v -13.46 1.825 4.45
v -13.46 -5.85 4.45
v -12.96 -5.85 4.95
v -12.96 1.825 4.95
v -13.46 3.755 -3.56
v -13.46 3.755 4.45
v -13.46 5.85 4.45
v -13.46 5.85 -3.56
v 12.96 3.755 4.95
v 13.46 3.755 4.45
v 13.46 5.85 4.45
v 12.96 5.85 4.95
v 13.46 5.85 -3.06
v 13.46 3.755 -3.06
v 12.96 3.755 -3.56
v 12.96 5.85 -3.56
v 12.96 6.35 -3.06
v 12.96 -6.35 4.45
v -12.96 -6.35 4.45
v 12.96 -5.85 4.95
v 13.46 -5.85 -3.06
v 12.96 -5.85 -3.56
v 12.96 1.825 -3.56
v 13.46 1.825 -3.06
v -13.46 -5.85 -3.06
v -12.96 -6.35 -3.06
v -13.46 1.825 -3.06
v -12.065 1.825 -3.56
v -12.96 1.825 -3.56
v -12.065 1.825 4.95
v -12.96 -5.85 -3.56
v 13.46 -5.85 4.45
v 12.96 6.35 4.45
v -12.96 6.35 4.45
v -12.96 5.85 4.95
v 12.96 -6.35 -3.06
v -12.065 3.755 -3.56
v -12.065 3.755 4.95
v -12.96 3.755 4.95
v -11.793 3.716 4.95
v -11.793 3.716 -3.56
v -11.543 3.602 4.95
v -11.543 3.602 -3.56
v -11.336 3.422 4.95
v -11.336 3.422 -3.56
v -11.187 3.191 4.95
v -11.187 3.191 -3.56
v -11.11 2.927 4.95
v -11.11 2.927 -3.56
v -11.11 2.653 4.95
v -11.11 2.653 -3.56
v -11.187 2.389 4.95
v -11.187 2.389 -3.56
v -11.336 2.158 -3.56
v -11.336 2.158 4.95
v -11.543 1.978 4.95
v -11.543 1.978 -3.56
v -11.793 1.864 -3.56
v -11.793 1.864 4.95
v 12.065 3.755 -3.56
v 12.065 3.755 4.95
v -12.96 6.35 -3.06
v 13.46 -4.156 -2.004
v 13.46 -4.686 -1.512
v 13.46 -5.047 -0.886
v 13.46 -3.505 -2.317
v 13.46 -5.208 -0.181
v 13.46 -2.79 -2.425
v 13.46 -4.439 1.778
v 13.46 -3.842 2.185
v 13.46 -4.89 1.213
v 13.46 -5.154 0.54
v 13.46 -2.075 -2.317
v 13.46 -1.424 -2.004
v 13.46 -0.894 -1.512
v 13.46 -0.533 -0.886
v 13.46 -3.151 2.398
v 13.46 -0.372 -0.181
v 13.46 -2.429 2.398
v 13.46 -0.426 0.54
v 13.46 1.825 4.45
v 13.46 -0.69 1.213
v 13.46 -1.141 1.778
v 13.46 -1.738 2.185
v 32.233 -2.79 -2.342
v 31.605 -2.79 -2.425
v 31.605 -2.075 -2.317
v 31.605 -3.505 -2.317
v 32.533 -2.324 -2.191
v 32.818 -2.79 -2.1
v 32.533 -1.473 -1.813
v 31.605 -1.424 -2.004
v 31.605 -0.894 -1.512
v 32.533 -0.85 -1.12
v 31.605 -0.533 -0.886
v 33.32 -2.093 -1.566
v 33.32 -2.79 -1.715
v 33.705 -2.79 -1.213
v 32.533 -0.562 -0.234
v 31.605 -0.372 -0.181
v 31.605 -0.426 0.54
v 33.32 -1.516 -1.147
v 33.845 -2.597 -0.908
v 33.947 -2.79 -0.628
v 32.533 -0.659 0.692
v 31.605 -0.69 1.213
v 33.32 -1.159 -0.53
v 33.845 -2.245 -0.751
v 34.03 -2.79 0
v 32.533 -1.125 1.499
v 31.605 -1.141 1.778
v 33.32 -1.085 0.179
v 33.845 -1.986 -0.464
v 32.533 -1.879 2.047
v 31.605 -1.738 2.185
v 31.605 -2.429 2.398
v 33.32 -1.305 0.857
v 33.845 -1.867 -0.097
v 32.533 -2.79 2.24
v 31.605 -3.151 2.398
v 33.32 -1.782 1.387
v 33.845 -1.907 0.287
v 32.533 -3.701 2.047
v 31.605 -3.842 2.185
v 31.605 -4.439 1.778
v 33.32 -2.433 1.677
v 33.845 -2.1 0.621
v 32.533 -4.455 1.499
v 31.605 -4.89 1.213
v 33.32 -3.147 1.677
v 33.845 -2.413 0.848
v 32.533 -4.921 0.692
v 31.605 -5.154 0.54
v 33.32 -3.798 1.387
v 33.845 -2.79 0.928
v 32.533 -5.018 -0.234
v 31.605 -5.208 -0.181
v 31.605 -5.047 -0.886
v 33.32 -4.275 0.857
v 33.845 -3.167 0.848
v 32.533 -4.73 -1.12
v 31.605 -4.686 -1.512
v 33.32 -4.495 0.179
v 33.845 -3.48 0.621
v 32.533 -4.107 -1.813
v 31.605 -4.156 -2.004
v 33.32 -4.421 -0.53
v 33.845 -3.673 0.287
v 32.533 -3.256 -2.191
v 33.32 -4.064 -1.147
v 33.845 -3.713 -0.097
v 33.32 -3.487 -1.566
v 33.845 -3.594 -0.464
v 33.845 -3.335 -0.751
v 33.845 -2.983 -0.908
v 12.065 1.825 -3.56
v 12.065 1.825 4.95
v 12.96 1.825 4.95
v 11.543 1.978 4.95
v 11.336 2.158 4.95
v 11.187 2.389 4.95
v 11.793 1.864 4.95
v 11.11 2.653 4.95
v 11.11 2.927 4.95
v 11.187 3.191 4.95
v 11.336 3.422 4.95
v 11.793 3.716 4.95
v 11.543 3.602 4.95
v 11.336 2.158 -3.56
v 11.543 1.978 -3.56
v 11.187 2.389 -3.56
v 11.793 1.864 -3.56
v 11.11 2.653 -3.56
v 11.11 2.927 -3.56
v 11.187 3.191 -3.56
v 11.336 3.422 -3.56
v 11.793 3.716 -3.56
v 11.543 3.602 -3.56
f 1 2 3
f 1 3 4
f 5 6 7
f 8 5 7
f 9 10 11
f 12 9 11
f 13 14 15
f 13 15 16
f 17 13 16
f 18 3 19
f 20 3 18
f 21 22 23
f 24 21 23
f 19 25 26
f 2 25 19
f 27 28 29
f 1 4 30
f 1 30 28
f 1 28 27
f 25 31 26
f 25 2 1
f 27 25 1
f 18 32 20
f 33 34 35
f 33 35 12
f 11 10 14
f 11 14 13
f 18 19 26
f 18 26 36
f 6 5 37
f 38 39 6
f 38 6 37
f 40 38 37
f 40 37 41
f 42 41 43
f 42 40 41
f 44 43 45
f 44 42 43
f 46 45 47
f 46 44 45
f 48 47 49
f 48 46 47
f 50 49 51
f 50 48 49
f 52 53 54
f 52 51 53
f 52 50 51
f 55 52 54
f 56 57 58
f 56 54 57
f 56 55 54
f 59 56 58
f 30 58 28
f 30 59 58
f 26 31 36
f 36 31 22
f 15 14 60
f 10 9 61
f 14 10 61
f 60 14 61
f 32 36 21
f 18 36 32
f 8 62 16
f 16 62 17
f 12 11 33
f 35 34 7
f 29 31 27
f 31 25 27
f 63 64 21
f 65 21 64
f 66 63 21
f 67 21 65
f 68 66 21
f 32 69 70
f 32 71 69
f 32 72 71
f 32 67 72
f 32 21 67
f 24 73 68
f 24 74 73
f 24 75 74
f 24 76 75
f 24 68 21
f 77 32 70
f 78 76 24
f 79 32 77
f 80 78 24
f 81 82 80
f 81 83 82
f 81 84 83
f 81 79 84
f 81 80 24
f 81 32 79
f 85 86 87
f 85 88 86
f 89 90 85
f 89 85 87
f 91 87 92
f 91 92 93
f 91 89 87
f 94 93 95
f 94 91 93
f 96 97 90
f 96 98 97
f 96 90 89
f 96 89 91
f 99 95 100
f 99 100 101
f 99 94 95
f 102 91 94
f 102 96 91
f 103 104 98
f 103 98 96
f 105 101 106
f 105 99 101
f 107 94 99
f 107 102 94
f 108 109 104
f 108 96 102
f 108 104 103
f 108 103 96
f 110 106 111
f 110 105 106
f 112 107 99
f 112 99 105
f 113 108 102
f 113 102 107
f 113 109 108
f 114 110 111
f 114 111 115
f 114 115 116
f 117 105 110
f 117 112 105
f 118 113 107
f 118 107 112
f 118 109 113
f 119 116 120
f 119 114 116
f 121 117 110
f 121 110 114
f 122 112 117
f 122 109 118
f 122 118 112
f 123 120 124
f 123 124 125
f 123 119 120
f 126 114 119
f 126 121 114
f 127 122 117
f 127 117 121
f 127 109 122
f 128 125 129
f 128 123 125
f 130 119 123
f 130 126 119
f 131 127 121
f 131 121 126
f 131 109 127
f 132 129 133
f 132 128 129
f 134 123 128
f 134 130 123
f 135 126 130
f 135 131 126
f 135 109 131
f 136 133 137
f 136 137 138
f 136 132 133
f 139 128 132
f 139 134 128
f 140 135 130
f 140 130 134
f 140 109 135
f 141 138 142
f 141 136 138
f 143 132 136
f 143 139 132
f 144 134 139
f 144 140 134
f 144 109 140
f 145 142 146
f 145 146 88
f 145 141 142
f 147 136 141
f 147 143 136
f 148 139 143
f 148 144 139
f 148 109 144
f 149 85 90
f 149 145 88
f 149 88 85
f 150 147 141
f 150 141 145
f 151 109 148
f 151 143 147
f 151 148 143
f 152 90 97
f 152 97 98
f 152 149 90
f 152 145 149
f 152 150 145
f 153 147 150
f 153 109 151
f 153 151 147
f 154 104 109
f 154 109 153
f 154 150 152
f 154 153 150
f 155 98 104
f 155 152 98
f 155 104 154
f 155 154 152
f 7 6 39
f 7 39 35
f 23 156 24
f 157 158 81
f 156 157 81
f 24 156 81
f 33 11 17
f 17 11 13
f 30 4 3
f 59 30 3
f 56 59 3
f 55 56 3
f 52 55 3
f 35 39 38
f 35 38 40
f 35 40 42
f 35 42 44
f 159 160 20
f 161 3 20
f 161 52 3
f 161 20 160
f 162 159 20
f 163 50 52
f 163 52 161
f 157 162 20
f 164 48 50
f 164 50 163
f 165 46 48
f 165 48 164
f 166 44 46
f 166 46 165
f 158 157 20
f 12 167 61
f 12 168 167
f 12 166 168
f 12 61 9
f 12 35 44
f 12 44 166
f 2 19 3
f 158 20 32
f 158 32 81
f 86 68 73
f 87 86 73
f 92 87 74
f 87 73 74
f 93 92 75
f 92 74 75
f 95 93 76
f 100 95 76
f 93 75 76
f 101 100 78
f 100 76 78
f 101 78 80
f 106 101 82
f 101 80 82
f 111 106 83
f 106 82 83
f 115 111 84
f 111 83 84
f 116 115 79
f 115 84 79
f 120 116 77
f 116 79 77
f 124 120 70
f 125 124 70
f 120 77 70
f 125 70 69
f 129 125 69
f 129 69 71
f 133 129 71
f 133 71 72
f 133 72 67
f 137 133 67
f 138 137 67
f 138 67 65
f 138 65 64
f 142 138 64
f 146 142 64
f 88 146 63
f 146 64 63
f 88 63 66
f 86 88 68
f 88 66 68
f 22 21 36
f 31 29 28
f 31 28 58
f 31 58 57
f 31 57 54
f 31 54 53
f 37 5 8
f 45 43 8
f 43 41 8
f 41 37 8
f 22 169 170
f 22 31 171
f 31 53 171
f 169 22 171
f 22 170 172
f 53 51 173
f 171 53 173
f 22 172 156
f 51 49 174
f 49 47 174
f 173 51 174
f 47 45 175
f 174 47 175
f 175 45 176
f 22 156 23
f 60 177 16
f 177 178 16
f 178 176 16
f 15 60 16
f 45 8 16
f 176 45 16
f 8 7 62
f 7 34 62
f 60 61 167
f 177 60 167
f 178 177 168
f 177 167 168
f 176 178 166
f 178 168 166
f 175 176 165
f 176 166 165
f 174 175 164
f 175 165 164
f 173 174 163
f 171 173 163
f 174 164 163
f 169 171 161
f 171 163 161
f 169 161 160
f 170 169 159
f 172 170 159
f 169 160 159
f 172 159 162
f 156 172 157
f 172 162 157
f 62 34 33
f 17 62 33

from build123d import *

# Parameters (mm, degrees)
SKETCH1_W                = 26.92
SKETCH1_H                = 12.7
BOSS_EXTRUDE1_DEPTH      = 4.95
BOSS_EXTRUDE1_DEPTH_BACK = 3.56
CUT_EXTRUDE1_DEPTH       = 9.51
SKETCH3_R                = 2.425
BOSS_EXTRUDE2_DEPTH      = 20.57
FILLET1_R                = 2.425
CHAMFER1_SIZE            = 0.5


with BuildPart() as part:
    # Sketch1 → Boss-Extrude1 (new body, two sides)
    with BuildSketch(Plane.XY) as boss_extrude1_sk:
        Rectangle(SKETCH1_W, SKETCH1_H)
    extrude(amount=BOSS_EXTRUDE1_DEPTH)
    extrude(boss_extrude1_sk.sketch, amount=-BOSS_EXTRUDE1_DEPTH_BACK)

    # Sketch2 → Cut-Extrude1 (cut, through all)
    with BuildSketch(Plane.XY.offset(4.95)):
        with BuildLine():
            Line((-12.065, 1.825), (-13.46, 1.825))
            ThreePointArc((-13.46, 1.825), (-14.425, 2.79), (-13.46, 3.755))
            Line((-13.46, 3.755), (-12.065, 3.755))
            ThreePointArc((-12.065, 3.755), (-11.1, 2.79), (-12.065, 1.825))
        make_face()
        with BuildLine():
            Line((12.065, 1.825), (13.46, 1.825))
            ThreePointArc((13.46, 1.825), (14.425, 2.79), (13.46, 3.755))
            Line((13.46, 3.755), (12.065, 3.755))
            ThreePointArc((12.065, 3.755), (11.1, 2.79), (12.065, 1.825))
        make_face()
    extrude(amount=-CUT_EXTRUDE1_DEPTH, mode=Mode.SUBTRACT)

    # Sketch3 → Boss-Extrude2 (add)
    with BuildSketch(Plane(origin=(13.46, 0, 0), x_dir=(0, 0, -1), z_dir=(1, 0, 0))):
        with Locations((0, -2.79)):
            Circle(SKETCH3_R)
    extrude(amount=BOSS_EXTRUDE2_DEPTH)

    # Fillet1
    fillet1_edges = [part.edges().sort_by_distance(p)[0] for p in [
        (34.03, -2.79, 2.425),
    ]]
    fillet(fillet1_edges, radius=FILLET1_R)

    # Chamfer1
    chamfer1_edges = [part.edges().sort_by_distance(p)[0] for p in [
        (13.46, 6.35, 0.695),
        (13.46, 5.0525, -3.56),
        (0, 6.35, -3.56),
        (-13.46, 6.35, 0.695),
        (13.46, 5.0525, 4.95),
        (0, 6.35, 4.95),
        (-13.46, 5.0525, 4.95),
        (13.46, -6.35, 0.695),
        (-13.46, -2.2625, -3.56),
        (13.46, -2.2625, -3.56),
        (0, -6.35, -3.56),
        (-13.46, -6.35, 0.695),
        (13.46, -2.2625, 4.95),
        (0, -6.35, 4.95),
        (-13.46, -2.2625, 4.95),
    ]]
    chamfer(chamfer1_edges, length=CHAMFER1_SIZE)


solid = part.part
